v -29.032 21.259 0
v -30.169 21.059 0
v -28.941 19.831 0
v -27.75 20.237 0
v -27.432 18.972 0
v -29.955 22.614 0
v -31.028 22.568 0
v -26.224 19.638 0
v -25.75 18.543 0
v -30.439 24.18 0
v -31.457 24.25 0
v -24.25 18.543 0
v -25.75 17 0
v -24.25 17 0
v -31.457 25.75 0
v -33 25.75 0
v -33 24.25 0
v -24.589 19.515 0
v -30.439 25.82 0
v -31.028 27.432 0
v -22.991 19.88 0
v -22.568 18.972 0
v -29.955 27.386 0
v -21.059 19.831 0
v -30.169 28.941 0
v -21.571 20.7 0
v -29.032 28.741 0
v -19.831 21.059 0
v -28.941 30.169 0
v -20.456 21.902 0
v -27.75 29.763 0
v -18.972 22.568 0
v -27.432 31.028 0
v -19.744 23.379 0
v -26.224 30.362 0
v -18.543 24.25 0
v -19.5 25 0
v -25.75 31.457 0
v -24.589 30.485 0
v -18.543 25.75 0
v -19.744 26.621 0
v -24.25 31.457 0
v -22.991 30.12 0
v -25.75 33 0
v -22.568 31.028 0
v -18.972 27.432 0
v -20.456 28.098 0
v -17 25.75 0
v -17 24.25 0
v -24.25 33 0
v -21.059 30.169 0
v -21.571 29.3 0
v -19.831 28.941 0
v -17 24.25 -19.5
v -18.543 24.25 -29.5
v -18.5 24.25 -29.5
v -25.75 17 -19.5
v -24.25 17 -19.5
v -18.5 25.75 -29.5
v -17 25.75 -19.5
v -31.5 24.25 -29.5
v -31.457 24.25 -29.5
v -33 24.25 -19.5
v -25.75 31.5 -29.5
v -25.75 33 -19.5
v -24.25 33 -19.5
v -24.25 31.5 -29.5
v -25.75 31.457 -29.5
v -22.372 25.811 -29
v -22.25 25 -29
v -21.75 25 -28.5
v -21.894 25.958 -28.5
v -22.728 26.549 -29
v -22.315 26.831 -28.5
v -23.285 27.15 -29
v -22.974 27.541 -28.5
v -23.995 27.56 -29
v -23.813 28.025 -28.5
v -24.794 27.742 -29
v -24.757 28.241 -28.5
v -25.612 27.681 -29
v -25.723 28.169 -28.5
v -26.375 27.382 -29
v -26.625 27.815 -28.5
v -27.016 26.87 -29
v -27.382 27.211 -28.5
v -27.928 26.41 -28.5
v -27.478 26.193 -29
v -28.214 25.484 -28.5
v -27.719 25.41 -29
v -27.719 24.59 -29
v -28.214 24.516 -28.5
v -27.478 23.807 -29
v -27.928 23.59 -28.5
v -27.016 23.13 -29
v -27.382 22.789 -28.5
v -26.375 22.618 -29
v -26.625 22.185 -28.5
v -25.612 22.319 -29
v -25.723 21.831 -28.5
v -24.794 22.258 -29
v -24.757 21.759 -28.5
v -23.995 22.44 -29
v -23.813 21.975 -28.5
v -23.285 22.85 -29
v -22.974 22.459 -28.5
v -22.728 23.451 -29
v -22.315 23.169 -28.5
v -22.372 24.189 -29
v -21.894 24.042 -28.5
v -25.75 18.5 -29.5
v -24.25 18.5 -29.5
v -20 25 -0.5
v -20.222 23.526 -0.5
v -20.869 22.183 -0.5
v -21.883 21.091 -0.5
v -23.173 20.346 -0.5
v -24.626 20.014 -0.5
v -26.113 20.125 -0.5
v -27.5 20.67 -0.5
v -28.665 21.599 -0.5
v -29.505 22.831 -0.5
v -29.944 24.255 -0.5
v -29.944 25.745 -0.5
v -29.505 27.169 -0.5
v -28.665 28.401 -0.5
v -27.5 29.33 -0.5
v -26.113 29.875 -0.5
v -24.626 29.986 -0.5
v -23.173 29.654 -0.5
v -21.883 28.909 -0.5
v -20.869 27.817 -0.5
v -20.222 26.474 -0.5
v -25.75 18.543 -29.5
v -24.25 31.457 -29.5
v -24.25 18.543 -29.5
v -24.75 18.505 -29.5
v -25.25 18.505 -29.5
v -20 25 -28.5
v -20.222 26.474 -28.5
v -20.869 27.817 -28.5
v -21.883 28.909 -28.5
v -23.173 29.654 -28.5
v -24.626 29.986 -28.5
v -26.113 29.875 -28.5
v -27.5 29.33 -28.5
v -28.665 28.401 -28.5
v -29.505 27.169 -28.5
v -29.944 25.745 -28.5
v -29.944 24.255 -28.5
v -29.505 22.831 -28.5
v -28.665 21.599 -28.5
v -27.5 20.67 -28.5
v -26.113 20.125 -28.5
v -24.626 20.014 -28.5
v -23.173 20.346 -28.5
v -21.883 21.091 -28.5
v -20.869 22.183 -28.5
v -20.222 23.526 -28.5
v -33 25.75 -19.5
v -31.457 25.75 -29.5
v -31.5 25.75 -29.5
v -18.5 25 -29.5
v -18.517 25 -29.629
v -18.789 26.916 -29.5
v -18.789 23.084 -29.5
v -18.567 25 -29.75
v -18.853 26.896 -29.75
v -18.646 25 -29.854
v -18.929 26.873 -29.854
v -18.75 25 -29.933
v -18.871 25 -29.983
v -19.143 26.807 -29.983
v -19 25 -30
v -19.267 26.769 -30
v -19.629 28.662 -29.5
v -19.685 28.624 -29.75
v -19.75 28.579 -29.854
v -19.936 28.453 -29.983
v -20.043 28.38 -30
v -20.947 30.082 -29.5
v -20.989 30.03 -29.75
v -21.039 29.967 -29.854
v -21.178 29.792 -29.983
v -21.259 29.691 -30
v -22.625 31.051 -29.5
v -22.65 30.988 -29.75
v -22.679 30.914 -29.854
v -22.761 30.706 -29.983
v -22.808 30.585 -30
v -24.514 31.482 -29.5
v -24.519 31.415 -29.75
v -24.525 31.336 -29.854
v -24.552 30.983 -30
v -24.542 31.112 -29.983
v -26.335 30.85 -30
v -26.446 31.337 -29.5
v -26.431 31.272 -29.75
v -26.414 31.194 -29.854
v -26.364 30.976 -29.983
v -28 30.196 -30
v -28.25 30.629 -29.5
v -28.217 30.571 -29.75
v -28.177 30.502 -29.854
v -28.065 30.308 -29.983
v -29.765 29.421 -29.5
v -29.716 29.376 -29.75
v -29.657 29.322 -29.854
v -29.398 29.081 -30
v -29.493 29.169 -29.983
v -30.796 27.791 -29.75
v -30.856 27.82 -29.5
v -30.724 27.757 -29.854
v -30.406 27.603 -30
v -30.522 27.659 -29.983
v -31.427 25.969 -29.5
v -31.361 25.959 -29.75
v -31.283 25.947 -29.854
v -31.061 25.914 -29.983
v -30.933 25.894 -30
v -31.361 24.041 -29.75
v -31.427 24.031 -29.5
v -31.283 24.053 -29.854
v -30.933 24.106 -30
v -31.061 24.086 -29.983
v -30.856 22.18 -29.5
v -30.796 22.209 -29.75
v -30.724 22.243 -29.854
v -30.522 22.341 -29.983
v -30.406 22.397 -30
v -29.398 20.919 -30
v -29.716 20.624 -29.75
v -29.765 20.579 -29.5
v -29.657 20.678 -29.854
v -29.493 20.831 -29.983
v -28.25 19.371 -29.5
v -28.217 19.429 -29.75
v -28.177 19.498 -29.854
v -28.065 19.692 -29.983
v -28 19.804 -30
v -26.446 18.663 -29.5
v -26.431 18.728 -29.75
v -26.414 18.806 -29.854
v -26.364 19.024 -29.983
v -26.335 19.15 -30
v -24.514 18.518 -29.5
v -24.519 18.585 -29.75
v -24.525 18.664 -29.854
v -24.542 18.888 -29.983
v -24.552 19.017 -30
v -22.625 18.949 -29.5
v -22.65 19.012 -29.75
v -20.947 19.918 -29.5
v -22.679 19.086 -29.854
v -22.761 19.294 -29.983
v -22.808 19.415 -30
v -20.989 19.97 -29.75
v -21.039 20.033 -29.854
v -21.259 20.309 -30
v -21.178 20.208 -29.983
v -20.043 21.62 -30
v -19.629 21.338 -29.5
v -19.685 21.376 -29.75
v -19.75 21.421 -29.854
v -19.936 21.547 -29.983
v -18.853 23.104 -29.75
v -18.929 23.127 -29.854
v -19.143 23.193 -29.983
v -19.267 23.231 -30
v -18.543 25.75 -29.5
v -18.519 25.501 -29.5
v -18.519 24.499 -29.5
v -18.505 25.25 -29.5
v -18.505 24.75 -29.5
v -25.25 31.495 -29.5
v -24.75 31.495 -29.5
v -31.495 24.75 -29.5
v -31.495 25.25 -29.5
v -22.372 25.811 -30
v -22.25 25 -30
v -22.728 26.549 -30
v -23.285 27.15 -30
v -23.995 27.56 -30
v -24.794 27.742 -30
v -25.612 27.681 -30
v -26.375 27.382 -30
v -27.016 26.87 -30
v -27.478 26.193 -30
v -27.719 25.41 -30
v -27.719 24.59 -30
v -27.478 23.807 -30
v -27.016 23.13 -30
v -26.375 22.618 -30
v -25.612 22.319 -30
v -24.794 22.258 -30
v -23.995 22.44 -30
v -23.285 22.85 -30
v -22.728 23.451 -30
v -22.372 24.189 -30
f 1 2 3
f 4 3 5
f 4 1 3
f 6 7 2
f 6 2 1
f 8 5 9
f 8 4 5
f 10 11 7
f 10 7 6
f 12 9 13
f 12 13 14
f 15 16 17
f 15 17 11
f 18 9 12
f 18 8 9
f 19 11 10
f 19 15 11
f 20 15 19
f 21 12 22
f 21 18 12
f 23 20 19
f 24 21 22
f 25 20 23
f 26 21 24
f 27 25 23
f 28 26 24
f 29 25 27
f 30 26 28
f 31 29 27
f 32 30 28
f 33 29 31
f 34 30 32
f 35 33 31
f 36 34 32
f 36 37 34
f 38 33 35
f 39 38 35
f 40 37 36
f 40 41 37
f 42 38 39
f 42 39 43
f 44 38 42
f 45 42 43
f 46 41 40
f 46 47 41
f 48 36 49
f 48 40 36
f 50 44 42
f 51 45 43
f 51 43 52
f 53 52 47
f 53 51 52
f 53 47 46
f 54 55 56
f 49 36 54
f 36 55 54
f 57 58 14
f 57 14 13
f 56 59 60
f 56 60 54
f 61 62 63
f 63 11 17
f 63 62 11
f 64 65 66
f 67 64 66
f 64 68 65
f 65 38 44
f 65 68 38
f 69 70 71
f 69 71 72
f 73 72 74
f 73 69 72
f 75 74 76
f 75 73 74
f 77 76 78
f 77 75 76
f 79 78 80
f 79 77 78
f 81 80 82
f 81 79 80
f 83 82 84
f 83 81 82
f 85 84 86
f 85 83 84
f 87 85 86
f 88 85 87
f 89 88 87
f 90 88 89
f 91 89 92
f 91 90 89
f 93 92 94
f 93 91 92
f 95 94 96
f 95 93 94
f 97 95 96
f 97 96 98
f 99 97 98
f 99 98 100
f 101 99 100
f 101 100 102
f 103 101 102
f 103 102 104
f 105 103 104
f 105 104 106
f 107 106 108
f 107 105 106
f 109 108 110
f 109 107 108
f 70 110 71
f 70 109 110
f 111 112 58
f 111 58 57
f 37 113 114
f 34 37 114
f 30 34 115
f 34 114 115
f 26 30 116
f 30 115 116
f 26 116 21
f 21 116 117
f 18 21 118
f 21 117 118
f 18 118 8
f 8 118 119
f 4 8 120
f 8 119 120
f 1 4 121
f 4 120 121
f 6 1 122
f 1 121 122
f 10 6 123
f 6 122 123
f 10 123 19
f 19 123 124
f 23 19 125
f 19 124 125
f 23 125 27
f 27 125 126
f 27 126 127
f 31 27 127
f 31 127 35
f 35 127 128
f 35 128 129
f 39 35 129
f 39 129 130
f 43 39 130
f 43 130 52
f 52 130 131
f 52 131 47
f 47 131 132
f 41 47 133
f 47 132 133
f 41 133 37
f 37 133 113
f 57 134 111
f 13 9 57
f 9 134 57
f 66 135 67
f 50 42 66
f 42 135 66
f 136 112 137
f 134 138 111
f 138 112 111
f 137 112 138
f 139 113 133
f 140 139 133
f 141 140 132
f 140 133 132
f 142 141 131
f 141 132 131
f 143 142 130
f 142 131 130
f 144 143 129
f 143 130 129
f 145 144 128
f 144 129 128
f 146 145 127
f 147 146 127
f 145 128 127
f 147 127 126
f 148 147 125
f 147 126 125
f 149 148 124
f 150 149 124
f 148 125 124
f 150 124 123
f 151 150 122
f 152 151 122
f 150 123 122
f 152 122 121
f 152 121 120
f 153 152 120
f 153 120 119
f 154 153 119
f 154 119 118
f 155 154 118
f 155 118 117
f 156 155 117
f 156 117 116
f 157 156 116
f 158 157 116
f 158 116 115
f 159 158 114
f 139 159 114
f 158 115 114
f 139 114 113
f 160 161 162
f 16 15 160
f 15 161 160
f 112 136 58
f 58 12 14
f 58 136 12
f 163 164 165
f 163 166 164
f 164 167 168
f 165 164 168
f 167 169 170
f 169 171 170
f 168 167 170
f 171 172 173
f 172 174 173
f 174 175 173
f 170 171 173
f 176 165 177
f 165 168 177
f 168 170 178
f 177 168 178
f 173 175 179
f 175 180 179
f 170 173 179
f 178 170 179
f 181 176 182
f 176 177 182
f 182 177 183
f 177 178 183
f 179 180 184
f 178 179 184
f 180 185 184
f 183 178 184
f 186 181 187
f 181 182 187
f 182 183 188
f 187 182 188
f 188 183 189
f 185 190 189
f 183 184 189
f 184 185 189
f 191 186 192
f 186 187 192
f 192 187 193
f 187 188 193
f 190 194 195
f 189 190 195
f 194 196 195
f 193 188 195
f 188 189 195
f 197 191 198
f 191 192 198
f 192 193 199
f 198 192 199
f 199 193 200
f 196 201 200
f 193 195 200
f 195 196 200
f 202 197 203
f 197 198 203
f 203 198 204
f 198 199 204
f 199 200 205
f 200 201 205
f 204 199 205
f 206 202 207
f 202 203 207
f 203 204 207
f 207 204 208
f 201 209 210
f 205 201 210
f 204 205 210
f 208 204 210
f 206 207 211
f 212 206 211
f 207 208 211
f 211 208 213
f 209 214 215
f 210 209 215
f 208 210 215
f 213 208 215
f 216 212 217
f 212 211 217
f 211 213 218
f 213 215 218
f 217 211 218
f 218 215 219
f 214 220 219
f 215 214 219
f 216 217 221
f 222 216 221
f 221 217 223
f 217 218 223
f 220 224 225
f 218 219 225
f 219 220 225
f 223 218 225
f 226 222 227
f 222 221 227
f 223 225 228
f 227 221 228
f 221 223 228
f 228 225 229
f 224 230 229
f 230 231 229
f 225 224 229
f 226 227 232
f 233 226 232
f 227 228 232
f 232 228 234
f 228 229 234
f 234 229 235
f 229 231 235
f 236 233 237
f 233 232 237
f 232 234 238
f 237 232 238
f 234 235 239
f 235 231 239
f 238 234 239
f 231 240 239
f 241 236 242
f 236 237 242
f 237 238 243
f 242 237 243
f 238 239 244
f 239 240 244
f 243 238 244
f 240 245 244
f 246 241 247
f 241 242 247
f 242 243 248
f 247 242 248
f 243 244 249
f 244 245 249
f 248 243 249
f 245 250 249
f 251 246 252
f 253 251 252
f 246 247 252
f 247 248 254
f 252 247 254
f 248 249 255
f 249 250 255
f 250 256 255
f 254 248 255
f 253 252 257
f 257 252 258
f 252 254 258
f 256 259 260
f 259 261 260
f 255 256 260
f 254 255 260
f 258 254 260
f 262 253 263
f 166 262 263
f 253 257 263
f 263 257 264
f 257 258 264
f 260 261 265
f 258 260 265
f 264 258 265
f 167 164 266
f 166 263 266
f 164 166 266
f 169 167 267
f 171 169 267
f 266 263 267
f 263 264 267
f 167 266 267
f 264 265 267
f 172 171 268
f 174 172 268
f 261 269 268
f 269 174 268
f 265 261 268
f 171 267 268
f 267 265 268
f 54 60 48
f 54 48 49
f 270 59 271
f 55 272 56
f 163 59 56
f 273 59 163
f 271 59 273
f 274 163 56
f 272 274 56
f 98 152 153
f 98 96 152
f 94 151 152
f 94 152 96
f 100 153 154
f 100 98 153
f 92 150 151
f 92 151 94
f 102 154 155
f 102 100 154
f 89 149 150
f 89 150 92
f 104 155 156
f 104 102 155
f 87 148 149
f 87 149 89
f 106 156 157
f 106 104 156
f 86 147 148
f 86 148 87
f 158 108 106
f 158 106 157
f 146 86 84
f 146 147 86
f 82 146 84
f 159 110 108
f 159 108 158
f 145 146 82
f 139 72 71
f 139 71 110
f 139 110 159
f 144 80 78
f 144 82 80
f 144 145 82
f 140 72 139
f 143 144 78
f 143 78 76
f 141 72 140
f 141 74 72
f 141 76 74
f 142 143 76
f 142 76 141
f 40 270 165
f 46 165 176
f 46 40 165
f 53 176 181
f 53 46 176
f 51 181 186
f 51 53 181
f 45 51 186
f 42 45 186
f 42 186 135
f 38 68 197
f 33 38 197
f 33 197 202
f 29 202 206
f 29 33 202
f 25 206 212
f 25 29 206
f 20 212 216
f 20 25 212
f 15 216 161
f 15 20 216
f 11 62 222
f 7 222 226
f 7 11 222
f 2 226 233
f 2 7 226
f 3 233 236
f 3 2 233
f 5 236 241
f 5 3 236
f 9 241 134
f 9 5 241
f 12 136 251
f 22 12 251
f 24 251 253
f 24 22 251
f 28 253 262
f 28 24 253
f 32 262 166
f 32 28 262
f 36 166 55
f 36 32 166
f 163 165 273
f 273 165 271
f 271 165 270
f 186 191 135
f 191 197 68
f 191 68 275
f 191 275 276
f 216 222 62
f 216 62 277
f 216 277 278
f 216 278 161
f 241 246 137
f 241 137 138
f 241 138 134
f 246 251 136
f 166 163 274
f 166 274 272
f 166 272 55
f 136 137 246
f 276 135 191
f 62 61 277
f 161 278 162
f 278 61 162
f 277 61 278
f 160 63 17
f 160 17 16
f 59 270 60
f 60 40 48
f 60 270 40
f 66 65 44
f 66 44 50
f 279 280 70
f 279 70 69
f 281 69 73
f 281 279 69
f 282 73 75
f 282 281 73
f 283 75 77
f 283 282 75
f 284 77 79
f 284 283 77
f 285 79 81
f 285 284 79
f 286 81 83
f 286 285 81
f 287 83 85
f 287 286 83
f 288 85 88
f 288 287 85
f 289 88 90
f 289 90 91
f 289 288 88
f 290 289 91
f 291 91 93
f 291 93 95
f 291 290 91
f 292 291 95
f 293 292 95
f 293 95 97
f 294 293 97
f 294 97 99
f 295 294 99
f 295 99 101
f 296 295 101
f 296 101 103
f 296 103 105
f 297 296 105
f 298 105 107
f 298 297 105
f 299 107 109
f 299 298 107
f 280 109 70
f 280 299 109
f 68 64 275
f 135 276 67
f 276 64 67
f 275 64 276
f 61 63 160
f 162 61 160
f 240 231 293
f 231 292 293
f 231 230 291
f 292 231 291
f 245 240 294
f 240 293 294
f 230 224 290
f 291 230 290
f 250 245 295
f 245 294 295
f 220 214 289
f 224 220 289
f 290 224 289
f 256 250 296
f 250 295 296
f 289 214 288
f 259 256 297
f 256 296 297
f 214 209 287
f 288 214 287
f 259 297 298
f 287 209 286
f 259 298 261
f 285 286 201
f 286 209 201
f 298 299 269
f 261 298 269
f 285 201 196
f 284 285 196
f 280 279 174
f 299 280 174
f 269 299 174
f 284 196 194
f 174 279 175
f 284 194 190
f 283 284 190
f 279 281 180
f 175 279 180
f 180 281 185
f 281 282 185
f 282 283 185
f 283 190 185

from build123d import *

# Parameters (mm, degrees)
F1_R        = 6.5
F1_R_2      = 5
F2_DEPTH    = 30
F4_W        = 1.5
F4_H        = 2.639524132
F5_DEPTH    = 29.5
F6_COUNT    = 4
F8_R        = 5
F8_R_2      = 2.75
F9_DEPTH    = 1.5
F10_SIZE2   = 1.49999
F10_SIZE    = 9.99999
F10_2_SIZE2 = 1.49999
F10_2_SIZE  = 9.99999
F10_3_SIZE2 = 1.49999
F10_3_SIZE  = 9.99999
F10_4_SIZE2 = 1.49999
F10_4_SIZE  = 9.99999
F11_SIZE    = 0.5
F12_R       = 0.49999


# Not quite as in the source:
# - a fillet or chamfer is up to 0.001 mm smaller than in the source, because OpenCascade refuses the exact size


with BuildPart() as f2:
    # F1 (on offset) → F2 (new body)
    with BuildSketch(Plane.XY):
        with Locations((-25, 25)):
            Circle(F1_R)
        with Locations((-25, 25)):
            Circle(F1_R_2, mode=Mode.SUBTRACT)
    extrude(amount=-F2_DEPTH)

    # F4 (on offset) → F5 (join)
    with BuildSketch(Plane.XY):
        with Locations((-25, 31.680237934)):
            Rectangle(F4_W, F4_H)
    extrude(amount=-F5_DEPTH)

    # F6: F2 ×4 about axis
    f6_axis = Axis((-25, 25, 0), (0, 0, 1))


with BuildPart() as f2_1:
    add(f2.part)
    for i in range(1, F6_COUNT):
        add(f2.part.rotate(f6_axis, i * 360 / F6_COUNT))

    # F8 (on offset) → F9 (join)
    with BuildSketch(Plane.XY.offset(-30)):
        with Locations((-25, 25)):
            Circle(F8_R)
        with Locations((-25, 25)):
            Circle(F8_R_2, mode=Mode.SUBTRACT)
    extrude(amount=F9_DEPTH)

    # F10 (size 10 and 1.5 in the source; OpenCascade refuses exactly that, so slightly less here)
    f10_edges = [f2_1.edges().sort_by_distance(p)[0] for p in [
        (-25, 17, -29.5),
    ]]
    f10_side = f2_1.faces().sort_by_distance((-25, 17, -14.75))[0]
    chamfer(f10_edges, length=F10_SIZE, length2=F10_SIZE2, reference=f10_side)

    # F10#2 (size 10 and 1.5 in the source; OpenCascade refuses exactly that, so slightly less here)
    f10_2_edges = [f2_1.edges().sort_by_distance(p)[0] for p in [
        (-17, 25, -29.5),
    ]]
    f10_2_side = f2_1.faces().sort_by_distance((-17, 25, -14.75))[0]
    chamfer(f10_2_edges, length=F10_2_SIZE, length2=F10_2_SIZE2, reference=f10_2_side)

    # F10#3 (size 10 and 1.5 in the source; OpenCascade refuses exactly that, so slightly less here)
    f10_3_edges = [f2_1.edges().sort_by_distance(p)[0] for p in [
        (-25, 33, -29.5),
    ]]
    f10_3_side = f2_1.faces().sort_by_distance((-25, 33, -14.75))[0]
    chamfer(f10_3_edges, length=F10_3_SIZE, length2=F10_3_SIZE2, reference=f10_3_side)

    # F10#4 (size 10 and 1.5 in the source; OpenCascade refuses exactly that, so slightly less here)
    f10_4_edges = [f2_1.edges().sort_by_distance(p)[0] for p in [
        (-33, 25, -29.5),
    ]]
    f10_4_side = f2_1.faces().sort_by_distance((-33, 25, -14.75))[0]
    chamfer(f10_4_edges, length=F10_4_SIZE, length2=F10_4_SIZE2, reference=f10_4_side)

    # F11
    f11_edges = [f2_1.edges().sort_by_distance(p)[0] for p in [
        (-30, 25, 0),
        (-27.75, 25, -28.5),
    ]]
    chamfer(f11_edges, length=F11_SIZE)

    # F12 (radius 0.5 in the source; OpenCascade refuses exactly that, so slightly less here)
    f12_edges = [f2_1.edges().sort_by_distance(p)[0] for p in [
        (-31.5, 25, -30),
    ]]
    fillet(f12_edges, radius=F12_R)


solid = f2_1.part
